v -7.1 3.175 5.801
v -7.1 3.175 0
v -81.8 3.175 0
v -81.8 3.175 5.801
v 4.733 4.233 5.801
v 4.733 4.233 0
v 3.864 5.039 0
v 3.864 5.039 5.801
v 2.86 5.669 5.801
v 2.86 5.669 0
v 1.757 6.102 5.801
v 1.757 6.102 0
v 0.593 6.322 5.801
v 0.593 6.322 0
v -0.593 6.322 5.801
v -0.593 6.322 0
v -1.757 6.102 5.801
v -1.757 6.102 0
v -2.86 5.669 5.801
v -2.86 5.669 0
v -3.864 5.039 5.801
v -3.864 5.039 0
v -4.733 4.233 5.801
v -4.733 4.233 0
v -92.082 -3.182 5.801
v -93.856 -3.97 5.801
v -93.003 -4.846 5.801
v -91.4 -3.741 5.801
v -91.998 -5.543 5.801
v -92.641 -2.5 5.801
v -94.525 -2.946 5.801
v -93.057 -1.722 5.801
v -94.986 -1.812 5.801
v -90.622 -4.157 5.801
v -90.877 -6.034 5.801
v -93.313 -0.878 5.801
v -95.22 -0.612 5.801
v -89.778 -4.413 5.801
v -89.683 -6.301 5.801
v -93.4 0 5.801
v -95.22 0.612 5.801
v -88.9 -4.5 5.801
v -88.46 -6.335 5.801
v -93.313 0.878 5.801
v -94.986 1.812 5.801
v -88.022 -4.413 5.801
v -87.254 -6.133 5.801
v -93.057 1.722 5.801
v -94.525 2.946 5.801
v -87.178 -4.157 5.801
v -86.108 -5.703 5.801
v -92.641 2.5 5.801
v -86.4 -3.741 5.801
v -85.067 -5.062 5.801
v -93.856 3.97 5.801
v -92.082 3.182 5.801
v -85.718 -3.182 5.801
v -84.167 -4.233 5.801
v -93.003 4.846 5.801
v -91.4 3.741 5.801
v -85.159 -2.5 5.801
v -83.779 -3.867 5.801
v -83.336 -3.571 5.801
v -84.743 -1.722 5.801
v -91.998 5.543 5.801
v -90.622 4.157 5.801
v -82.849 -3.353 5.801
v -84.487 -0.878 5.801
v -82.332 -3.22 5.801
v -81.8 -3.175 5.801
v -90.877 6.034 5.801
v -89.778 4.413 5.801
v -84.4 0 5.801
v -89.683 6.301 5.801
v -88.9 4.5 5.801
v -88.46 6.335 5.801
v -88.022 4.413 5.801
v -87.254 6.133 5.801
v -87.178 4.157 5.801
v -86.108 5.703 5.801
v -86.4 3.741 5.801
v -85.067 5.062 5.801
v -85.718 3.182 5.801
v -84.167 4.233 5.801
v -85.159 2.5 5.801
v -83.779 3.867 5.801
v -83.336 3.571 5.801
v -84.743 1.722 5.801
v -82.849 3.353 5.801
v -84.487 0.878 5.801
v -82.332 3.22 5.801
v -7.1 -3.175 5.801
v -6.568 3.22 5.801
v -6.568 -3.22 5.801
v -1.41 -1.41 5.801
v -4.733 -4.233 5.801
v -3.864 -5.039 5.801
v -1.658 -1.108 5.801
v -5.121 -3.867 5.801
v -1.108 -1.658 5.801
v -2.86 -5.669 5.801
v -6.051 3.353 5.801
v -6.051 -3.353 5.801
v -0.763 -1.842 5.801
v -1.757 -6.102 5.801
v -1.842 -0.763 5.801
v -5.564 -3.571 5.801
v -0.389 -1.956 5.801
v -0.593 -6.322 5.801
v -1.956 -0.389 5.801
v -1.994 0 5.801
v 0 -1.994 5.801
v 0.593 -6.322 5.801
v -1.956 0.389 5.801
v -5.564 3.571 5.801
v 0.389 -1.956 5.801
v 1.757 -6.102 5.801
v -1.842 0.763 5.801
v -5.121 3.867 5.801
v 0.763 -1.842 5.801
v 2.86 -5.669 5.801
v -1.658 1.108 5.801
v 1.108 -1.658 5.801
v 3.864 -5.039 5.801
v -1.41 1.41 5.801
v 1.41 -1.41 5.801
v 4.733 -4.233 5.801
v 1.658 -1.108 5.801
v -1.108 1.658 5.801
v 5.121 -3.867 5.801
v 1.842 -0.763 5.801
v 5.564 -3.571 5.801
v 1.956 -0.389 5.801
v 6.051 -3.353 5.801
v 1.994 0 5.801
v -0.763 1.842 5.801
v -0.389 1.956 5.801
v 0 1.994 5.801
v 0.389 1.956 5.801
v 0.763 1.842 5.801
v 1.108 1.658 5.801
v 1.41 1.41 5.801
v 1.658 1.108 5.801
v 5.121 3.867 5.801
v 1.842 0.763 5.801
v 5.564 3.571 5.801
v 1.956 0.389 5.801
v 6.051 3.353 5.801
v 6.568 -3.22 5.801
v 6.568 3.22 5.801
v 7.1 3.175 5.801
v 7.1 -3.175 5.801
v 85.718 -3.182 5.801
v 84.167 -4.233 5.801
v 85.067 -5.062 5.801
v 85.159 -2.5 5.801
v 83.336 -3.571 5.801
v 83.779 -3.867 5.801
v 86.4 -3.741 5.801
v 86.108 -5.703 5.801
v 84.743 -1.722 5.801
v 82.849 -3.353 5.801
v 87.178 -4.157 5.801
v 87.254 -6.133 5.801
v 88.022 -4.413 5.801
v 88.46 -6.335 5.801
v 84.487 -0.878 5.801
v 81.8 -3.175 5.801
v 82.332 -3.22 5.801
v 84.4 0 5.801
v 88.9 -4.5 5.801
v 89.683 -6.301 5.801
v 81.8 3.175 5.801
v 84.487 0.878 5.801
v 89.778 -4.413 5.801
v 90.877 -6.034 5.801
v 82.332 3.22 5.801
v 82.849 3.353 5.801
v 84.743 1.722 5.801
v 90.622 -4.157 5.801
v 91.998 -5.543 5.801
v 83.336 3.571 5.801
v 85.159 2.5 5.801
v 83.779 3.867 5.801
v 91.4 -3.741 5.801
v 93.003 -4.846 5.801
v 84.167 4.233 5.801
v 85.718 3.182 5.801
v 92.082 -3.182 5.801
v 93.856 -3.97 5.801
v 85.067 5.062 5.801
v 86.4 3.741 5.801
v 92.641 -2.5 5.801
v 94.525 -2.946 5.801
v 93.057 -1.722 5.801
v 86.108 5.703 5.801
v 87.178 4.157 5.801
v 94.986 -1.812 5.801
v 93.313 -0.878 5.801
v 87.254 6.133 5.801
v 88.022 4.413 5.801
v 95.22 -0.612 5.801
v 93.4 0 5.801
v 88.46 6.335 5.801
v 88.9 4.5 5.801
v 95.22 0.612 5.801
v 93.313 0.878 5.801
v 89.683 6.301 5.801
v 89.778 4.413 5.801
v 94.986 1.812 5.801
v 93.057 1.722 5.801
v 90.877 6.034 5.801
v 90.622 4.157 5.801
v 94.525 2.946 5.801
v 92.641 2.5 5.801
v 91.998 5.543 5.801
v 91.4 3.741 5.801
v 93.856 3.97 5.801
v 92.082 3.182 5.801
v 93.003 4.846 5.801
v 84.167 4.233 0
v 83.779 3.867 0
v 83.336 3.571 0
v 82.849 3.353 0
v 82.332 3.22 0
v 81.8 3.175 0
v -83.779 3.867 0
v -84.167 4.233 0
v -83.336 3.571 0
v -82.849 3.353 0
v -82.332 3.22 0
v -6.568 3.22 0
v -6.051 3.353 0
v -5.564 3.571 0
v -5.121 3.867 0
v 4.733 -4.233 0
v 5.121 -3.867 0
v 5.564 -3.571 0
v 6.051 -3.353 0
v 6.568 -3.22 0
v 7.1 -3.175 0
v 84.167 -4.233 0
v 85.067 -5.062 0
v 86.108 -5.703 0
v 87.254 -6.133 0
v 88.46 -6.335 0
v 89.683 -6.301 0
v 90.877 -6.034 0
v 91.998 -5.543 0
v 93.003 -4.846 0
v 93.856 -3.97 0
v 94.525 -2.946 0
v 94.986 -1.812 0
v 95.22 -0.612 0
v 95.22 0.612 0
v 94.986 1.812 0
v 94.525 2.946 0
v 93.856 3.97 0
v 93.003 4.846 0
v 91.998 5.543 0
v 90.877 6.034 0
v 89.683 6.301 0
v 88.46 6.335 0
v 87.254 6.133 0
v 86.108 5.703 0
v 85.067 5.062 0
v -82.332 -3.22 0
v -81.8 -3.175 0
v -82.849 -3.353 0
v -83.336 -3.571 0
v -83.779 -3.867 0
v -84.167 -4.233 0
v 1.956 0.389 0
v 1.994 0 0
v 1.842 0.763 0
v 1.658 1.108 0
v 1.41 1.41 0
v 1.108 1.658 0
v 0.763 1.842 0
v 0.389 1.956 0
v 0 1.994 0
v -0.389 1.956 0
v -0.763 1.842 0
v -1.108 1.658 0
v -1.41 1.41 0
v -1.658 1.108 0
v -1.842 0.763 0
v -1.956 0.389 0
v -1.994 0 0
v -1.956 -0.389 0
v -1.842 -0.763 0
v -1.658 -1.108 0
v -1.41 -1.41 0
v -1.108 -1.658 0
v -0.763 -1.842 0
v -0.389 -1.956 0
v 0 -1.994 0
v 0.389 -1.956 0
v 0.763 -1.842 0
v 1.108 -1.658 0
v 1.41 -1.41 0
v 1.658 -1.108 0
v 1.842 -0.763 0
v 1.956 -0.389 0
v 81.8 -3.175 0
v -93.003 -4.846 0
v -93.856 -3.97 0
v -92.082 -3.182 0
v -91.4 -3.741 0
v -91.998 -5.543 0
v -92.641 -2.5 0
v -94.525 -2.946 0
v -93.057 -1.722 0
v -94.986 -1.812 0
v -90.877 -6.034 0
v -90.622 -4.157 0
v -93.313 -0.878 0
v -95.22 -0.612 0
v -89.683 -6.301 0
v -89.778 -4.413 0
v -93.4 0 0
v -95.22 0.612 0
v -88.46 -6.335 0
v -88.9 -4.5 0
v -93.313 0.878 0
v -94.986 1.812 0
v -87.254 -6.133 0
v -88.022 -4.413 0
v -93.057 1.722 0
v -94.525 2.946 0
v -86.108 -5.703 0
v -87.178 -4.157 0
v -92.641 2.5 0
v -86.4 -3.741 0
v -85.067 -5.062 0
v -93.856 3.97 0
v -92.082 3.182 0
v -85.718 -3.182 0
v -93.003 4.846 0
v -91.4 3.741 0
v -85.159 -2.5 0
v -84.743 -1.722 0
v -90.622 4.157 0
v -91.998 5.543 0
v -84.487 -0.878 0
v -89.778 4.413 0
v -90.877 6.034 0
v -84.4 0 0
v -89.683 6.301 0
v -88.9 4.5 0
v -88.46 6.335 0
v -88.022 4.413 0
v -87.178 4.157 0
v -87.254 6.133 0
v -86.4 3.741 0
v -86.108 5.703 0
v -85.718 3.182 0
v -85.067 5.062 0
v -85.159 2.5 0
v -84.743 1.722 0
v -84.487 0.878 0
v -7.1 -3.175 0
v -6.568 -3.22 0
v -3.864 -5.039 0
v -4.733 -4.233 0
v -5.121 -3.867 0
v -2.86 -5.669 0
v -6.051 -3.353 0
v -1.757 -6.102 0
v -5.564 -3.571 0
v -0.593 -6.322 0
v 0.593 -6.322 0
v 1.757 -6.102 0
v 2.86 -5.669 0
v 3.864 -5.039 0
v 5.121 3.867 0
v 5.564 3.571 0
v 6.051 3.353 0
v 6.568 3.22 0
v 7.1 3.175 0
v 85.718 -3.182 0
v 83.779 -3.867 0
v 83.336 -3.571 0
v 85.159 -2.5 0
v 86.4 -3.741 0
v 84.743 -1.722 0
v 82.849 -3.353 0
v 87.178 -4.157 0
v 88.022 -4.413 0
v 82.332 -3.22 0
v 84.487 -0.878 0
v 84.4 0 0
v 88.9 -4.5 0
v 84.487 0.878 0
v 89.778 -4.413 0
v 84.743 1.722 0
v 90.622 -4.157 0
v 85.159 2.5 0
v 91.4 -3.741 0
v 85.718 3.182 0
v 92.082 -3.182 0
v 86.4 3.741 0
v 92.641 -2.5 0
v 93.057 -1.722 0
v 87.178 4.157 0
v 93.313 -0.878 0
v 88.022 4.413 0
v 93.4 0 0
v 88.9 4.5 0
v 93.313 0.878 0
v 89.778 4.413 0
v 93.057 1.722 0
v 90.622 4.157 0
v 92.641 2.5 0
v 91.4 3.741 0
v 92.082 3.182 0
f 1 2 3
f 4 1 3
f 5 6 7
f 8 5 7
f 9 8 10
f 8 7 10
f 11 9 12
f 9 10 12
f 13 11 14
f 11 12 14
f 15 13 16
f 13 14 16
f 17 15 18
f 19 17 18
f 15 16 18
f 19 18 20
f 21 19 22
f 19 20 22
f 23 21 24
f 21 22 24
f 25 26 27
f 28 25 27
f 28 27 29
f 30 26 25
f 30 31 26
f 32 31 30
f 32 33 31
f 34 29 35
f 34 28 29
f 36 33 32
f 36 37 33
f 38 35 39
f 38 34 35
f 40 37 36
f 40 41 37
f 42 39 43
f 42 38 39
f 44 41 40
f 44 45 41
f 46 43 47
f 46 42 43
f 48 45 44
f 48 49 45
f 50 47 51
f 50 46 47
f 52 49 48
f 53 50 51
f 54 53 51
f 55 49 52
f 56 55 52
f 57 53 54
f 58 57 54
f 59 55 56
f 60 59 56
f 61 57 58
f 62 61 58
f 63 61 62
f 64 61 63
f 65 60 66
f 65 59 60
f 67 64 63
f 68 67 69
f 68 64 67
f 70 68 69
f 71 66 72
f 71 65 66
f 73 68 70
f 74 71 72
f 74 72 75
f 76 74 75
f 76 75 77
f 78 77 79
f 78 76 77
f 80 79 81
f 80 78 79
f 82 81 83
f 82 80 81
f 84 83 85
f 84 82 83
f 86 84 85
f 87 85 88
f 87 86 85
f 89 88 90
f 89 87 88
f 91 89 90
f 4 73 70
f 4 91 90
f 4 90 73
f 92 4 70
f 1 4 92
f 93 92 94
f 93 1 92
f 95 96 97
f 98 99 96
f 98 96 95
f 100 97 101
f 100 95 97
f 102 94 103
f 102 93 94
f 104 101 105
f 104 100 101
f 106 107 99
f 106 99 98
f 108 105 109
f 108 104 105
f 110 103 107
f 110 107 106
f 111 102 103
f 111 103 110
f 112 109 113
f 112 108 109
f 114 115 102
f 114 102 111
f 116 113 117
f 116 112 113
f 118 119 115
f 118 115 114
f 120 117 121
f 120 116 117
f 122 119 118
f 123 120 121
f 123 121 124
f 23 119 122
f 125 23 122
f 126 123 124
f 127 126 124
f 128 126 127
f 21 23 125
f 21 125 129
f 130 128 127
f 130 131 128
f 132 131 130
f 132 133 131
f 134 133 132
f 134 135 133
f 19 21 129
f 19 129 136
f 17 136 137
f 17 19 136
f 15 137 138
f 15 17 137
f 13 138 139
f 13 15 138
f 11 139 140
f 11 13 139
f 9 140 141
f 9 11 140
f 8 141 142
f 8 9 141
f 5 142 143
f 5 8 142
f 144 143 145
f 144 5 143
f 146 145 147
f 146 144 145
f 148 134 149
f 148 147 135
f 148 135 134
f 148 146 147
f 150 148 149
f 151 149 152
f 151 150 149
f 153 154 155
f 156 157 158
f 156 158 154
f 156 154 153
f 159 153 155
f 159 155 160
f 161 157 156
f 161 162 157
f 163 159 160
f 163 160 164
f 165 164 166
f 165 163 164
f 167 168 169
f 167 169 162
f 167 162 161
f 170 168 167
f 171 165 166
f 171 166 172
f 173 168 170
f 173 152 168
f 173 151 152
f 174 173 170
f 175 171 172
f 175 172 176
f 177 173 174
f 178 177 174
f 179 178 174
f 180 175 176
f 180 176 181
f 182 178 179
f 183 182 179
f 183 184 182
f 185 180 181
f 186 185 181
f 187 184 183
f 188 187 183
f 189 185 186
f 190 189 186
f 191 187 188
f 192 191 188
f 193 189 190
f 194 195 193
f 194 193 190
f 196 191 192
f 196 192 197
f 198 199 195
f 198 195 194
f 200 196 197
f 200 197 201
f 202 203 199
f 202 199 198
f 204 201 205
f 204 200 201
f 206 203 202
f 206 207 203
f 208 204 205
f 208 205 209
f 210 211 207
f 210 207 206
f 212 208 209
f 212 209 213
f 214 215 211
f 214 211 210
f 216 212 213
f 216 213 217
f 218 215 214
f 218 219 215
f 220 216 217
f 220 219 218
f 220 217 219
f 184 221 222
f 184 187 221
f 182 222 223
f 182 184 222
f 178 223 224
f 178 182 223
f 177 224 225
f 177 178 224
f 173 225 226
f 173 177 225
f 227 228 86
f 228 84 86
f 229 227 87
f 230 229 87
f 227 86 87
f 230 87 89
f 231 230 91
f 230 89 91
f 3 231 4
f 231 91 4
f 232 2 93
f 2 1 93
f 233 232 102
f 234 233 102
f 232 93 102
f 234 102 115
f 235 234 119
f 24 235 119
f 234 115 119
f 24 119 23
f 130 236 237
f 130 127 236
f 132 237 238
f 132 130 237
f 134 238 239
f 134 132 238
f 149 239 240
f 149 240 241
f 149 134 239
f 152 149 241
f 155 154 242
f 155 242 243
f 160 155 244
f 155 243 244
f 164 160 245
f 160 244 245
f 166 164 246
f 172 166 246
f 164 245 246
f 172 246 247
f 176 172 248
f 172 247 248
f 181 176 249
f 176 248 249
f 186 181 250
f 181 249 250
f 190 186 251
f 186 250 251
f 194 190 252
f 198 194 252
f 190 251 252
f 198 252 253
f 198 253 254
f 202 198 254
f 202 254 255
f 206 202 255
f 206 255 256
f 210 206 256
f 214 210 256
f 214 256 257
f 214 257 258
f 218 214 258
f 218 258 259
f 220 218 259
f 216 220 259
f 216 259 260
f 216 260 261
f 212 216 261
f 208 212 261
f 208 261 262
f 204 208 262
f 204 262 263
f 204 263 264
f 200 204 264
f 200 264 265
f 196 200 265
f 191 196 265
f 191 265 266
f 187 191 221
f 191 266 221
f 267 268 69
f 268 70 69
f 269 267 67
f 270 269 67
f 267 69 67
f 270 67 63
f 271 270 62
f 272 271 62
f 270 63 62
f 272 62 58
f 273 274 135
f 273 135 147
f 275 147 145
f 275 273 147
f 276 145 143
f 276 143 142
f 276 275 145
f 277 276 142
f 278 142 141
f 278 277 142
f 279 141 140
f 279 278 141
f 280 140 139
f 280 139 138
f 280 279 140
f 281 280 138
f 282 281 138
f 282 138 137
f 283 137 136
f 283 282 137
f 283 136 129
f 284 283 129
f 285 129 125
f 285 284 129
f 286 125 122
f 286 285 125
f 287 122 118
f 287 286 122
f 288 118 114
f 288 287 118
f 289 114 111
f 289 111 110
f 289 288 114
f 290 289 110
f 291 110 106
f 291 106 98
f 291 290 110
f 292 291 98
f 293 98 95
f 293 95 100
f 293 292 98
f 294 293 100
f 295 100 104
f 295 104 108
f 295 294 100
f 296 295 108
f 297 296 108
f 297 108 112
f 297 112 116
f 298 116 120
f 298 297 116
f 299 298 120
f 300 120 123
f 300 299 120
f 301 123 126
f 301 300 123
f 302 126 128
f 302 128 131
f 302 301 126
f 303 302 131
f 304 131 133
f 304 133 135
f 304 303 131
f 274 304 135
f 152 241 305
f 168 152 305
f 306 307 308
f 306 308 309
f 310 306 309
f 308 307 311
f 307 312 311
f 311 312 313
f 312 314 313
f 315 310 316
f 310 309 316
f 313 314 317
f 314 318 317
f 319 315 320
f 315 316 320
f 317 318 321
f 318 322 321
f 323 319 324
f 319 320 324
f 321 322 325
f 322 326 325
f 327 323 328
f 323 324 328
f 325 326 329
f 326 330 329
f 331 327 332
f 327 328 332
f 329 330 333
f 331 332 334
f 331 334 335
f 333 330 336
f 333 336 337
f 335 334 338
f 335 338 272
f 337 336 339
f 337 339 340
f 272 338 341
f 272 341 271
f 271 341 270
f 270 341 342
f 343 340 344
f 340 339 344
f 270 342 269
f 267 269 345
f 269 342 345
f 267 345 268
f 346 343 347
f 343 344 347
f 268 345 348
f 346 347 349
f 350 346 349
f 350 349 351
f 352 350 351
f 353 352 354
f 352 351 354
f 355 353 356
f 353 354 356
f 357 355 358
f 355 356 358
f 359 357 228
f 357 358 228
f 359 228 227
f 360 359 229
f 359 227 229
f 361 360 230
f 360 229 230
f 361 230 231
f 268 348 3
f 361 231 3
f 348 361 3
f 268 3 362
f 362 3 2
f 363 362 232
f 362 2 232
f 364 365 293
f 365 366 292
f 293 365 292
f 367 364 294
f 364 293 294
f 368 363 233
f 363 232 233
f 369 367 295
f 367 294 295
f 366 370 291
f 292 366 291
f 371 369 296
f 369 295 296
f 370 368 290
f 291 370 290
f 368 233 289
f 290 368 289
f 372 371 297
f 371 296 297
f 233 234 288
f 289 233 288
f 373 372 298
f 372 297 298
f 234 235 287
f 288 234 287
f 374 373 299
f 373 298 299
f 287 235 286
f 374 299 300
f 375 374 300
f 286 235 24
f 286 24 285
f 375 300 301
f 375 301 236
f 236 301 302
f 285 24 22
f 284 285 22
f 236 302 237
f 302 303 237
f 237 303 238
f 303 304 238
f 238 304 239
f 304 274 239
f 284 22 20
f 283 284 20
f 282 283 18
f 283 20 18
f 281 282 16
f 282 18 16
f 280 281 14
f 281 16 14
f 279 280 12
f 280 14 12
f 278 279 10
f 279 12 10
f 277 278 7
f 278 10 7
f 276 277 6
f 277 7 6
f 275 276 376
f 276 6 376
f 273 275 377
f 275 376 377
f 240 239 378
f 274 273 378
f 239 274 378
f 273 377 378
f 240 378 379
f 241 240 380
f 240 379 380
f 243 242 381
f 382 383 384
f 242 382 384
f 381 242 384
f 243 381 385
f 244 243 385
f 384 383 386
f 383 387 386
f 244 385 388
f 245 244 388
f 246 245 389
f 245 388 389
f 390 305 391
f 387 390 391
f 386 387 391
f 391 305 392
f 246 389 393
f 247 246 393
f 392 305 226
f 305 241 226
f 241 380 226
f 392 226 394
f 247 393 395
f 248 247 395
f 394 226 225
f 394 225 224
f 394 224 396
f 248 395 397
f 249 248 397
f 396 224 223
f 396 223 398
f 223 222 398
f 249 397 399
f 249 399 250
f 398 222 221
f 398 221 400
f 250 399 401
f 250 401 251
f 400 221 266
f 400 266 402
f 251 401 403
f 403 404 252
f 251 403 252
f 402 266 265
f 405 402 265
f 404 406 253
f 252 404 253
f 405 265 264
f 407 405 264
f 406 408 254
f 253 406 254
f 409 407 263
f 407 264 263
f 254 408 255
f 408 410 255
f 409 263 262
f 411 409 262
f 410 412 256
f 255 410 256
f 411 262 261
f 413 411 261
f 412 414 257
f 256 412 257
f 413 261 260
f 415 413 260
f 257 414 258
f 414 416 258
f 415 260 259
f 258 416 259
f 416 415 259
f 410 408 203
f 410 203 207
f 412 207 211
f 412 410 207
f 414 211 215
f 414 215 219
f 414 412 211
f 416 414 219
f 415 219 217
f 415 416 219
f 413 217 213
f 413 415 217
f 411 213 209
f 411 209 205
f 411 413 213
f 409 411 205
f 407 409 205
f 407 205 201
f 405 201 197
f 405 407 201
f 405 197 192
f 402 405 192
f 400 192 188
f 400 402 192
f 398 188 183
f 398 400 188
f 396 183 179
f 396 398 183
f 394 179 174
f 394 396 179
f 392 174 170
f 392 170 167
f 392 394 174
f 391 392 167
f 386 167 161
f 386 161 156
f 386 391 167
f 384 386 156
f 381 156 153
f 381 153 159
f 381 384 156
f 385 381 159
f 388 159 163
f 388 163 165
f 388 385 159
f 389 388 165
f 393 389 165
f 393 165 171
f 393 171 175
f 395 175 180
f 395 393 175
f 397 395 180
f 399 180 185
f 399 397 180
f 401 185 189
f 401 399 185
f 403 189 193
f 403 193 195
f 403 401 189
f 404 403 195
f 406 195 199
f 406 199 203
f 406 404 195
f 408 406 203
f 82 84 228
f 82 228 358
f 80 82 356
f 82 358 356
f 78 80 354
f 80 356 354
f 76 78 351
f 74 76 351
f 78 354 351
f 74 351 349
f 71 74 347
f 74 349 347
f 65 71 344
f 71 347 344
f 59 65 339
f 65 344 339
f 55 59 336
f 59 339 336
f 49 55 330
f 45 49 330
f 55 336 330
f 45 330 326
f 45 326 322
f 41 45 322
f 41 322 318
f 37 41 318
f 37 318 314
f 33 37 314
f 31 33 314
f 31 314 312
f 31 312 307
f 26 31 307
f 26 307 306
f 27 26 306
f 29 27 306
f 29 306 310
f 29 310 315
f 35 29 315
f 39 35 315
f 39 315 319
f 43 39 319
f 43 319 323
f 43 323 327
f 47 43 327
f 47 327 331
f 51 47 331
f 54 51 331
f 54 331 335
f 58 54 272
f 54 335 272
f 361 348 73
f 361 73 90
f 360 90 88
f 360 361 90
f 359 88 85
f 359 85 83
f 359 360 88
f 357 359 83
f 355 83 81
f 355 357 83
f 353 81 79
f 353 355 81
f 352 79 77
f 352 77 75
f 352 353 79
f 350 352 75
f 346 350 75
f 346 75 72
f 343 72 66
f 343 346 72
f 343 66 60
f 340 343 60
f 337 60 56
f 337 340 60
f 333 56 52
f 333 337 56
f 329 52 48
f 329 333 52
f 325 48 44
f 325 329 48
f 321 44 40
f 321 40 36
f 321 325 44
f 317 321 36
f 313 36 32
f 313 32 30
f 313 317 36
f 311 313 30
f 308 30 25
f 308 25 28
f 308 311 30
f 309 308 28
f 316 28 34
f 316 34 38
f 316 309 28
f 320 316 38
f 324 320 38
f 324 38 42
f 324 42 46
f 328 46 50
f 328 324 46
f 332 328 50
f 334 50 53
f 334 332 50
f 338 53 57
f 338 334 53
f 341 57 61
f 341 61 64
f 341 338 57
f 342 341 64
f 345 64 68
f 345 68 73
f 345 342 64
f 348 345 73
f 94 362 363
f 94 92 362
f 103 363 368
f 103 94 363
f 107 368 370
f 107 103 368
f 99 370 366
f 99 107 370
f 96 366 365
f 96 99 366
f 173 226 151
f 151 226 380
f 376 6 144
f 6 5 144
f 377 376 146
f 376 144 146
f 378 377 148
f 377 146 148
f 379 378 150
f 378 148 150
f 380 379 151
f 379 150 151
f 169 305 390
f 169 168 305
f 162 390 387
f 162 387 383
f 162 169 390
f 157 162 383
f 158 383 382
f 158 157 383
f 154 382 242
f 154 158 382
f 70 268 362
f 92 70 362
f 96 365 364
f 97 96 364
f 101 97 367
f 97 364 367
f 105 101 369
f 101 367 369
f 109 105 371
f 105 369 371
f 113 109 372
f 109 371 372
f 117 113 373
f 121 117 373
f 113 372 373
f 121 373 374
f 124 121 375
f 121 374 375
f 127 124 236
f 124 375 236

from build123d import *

# Parameters (mm, degrees)
SKETCH1_R           = 4.49961
SKETCH1_R_2         = 1.9939
BOSS_EXTRUDE1_DEPTH = 5.80136
FILLET1_R           = 3.175


with BuildPart() as part:
    # Sketch1 → Boss-Extrude1 (new body)
    with BuildSketch(Plane.XY):
        with BuildLine():
            Line((-83.400738686, -3.175), (-5.499261314, -3.175))
            ThreePointArc((-5.499261314, -3.175), (0, -6.35), (5.499261314, -3.175))
            Line((5.499261314, -3.175), (83.400738686, -3.175))
            ThreePointArc((83.400738686, -3.175), (95.25, 0), (83.400738686, 3.175))
            Line((83.400738686, 3.175), (5.499261314, 3.175))
            ThreePointArc((5.499261314, 3.175), (0, 6.35), (-5.499261314, 3.175))
            Line((-5.499261314, 3.175), (-83.400738686, 3.175))
            ThreePointArc((-83.400738686, 3.175), (-95.25, 0), (-83.400738686, -3.175))
        make_face()
        with Locations((-88.9, 0)):
            Circle(SKETCH1_R, mode=Mode.SUBTRACT)
        Circle(SKETCH1_R_2, mode=Mode.SUBTRACT)
        with Locations((88.9, 0)):
            Circle(SKETCH1_R, mode=Mode.SUBTRACT)
    extrude(amount=BOSS_EXTRUDE1_DEPTH)

    # Fillet1
    fillet1_edges = [part.edges().sort_by_distance(p)[0] for p in [
        (-83.400738686, 3.175, 2.90068),
        (-5.499261314, 3.175, 2.90068),
        (5.499261314, 3.175, 2.90068),
        (83.400738686, 3.175, 2.90068),
        (83.400738686, -3.175, 2.90068),
        (5.499261314, -3.175, 2.90068),
        (-5.499261314, -3.175, 2.90068),
        (-83.400738686, -3.175, 2.90068),
    ]]
    fillet(fillet1_edges, radius=FILLET1_R)


solid = part.part
